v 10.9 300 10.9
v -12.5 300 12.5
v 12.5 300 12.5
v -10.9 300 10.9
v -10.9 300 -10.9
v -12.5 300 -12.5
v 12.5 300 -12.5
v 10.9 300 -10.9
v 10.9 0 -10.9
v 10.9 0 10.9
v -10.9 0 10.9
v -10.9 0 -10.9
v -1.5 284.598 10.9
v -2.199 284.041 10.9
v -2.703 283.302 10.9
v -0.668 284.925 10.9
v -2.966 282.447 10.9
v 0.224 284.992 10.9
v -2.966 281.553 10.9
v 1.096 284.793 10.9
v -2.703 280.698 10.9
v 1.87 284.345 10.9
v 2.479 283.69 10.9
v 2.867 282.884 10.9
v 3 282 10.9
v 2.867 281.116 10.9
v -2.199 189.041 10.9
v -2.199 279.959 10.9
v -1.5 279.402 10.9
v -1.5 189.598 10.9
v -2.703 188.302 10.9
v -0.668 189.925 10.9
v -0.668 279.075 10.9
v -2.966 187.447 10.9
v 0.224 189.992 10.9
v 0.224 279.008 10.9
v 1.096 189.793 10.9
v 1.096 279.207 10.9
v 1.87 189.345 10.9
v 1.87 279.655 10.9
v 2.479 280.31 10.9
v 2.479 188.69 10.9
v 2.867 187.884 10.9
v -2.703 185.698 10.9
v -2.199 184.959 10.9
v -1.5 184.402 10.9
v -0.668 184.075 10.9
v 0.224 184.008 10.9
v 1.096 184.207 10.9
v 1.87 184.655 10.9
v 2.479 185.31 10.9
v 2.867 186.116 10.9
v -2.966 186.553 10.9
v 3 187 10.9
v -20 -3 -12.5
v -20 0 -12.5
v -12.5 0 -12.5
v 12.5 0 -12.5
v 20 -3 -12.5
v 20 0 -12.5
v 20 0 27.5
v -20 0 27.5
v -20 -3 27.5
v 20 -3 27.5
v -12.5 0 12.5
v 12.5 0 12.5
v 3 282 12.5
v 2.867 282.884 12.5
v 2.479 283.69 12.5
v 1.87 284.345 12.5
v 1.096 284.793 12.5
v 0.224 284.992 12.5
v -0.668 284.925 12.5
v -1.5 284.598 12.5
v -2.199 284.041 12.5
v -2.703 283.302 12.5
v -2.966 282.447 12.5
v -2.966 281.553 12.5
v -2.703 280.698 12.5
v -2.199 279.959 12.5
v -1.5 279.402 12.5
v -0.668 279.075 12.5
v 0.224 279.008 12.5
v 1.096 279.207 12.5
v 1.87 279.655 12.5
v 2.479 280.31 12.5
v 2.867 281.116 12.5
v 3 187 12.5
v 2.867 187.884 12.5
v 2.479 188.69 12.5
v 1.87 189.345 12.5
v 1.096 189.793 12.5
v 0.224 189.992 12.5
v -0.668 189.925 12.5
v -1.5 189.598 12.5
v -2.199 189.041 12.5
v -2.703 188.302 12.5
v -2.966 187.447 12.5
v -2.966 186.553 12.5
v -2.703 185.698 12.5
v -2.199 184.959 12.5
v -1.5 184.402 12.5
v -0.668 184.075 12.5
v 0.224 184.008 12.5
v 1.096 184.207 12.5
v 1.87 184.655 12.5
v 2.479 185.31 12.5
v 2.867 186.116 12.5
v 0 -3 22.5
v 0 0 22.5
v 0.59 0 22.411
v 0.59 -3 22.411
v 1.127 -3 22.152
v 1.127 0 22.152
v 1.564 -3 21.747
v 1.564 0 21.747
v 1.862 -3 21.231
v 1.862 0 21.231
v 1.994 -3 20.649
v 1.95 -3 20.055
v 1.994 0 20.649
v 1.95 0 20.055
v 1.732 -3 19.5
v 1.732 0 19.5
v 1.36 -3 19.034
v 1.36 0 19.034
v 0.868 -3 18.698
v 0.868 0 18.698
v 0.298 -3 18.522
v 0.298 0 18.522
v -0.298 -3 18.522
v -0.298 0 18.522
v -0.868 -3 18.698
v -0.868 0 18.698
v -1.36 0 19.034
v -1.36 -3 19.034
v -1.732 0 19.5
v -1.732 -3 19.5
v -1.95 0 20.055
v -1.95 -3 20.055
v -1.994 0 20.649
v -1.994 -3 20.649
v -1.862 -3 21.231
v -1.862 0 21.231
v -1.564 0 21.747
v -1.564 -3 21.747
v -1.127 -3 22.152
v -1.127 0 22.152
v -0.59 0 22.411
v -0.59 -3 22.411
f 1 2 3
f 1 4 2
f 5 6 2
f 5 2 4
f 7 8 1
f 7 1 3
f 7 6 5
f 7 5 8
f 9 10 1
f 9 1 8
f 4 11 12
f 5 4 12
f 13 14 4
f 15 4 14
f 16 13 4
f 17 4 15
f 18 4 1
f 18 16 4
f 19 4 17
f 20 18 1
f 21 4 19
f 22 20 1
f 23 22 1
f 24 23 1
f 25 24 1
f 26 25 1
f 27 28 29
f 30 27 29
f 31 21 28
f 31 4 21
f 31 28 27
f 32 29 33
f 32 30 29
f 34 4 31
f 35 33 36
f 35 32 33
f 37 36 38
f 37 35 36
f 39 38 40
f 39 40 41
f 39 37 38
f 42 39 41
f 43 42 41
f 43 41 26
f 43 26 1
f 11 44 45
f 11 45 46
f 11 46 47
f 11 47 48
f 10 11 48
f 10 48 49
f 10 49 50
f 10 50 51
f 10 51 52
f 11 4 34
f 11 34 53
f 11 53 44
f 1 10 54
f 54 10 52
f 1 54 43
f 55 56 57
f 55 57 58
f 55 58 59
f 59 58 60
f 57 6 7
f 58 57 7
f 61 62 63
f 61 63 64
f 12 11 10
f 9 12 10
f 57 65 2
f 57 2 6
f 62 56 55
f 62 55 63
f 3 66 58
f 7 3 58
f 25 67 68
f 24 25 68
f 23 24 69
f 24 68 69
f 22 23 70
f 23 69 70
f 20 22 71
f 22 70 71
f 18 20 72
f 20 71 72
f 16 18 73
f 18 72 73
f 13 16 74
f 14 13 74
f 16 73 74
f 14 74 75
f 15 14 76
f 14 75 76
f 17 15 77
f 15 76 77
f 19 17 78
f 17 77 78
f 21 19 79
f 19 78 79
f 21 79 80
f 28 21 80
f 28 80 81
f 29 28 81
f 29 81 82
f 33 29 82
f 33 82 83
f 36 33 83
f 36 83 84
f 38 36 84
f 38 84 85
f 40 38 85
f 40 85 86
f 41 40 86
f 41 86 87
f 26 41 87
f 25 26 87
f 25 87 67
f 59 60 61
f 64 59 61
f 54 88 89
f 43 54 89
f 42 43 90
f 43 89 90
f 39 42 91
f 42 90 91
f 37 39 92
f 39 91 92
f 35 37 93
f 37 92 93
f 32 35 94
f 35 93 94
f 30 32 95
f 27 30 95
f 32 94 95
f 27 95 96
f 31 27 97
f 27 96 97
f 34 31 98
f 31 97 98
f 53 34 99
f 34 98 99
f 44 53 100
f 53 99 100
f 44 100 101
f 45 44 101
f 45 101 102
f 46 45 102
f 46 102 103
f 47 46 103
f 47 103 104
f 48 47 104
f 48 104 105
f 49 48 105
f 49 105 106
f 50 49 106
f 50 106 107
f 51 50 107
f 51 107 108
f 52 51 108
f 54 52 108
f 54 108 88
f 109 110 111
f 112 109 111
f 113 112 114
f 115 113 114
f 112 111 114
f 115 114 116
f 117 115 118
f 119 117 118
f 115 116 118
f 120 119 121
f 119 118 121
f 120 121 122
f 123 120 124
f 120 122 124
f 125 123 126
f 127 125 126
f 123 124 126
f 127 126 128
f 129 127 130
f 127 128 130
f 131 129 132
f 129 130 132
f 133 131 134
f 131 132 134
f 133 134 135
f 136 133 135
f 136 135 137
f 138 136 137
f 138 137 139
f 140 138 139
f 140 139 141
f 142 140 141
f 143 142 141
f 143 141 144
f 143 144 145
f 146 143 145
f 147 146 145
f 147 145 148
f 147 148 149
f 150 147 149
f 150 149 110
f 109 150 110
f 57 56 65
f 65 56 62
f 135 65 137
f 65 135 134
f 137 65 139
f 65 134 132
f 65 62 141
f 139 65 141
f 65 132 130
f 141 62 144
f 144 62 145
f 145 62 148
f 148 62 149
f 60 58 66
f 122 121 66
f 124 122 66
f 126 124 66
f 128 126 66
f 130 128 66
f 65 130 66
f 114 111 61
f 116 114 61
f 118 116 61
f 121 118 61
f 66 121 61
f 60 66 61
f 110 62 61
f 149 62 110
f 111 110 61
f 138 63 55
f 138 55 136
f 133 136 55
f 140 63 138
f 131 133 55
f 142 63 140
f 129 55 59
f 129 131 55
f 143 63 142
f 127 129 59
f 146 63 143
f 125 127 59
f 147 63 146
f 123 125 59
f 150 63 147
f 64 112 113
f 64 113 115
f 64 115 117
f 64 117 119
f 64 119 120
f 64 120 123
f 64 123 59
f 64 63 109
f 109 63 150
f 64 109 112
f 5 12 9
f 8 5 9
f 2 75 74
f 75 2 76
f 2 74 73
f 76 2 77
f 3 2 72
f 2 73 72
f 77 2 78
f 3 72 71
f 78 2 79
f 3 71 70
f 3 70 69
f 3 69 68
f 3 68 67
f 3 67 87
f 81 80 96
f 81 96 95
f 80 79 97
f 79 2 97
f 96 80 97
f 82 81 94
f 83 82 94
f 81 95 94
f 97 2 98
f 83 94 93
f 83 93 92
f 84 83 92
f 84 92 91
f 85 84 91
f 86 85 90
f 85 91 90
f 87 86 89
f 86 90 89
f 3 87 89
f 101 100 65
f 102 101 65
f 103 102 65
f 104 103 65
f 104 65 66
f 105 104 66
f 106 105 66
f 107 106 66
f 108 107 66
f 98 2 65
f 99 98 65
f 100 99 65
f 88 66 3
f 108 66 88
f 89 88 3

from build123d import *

# Parameters (mm, degrees)
SKETCH1_W           = 25
SKETCH1_H           = 25
SKETCH1_W_2         = 21.8
SKETCH1_H_2         = 21.8
BOSS_EXTRUDE1_DEPTH = 300
SKETCH2_W           = 40
SKETCH2_H           = 40
BOSS_EXTRUDE2_DEPTH = 3
CUT_EXTRUDE1_REACH  = 303.703
SKETCH3_R           = 3
CUT_EXTRUDE2_REACH  = 303.921
SKETCH4_R           = 2


with BuildPart() as part:
    # Sketch1 → Boss-Extrude1 (new body)
    with BuildSketch(Plane(origin=(0, 0, 0), x_dir=(1, 0, 0), z_dir=(0, 1, 0))):
        Rectangle(SKETCH1_W, SKETCH1_H)
        Rectangle(SKETCH1_W_2, SKETCH1_H_2, mode=Mode.SUBTRACT)
    extrude(amount=BOSS_EXTRUDE1_DEPTH)

    # Sketch2 → Boss-Extrude2 (add)
    with BuildSketch(Plane.XZ):
        with Locations((0, 7.5)):
            Rectangle(SKETCH2_W, SKETCH2_H)
    extrude(amount=BOSS_EXTRUDE2_DEPTH)

    # Sketch3 → Cut-Extrude1 (cut, up to next)
    with BuildSketch(Plane.XY.offset(12.5), mode=Mode.PRIVATE) as cut_extrude1_sk1:
        with Locations((0, 187)):
            Circle(SKETCH3_R)
    cut_extrude1_tool1 = extrude(cut_extrude1_sk1.sketch, amount=-CUT_EXTRUDE1_REACH, mode=Mode.PRIVATE) & part.part
    # Sketch3 → Cut-Extrude1 (cut, up to next)
    with BuildSketch(Plane.XY.offset(12.5), mode=Mode.PRIVATE) as cut_extrude1_sk2:
        with Locations((0, 282)):
            Circle(SKETCH3_R)
    cut_extrude1_tool2 = extrude(cut_extrude1_sk2.sketch, amount=-CUT_EXTRUDE1_REACH, mode=Mode.PRIVATE) & part.part
    add(cut_extrude1_tool1.solids().sort_by_distance((0, 187, 12.5))[0], mode=Mode.SUBTRACT)
    add(cut_extrude1_tool2.solids().sort_by_distance((0, 282, 12.5))[0], mode=Mode.SUBTRACT)

    # Sketch4 → Cut-Extrude2 (cut, up to next)
    with BuildSketch(Plane(origin=(0, 0, 0), x_dir=(1, 0, 0), z_dir=(0, 1, 0)), mode=Mode.PRIVATE) as cut_extrude2_sk1:
        with Locations(Location((0, -20.5, 0), (0, 0, 270))):
            Circle(SKETCH4_R)
    cut_extrude2_tool1 = extrude(cut_extrude2_sk1.sketch, amount=-CUT_EXTRUDE2_REACH, mode=Mode.PRIVATE) & part.part
    add(cut_extrude2_tool1.solids().sort_by_distance((0, 0, 20.5))[0], mode=Mode.SUBTRACT)


solid = part.part
